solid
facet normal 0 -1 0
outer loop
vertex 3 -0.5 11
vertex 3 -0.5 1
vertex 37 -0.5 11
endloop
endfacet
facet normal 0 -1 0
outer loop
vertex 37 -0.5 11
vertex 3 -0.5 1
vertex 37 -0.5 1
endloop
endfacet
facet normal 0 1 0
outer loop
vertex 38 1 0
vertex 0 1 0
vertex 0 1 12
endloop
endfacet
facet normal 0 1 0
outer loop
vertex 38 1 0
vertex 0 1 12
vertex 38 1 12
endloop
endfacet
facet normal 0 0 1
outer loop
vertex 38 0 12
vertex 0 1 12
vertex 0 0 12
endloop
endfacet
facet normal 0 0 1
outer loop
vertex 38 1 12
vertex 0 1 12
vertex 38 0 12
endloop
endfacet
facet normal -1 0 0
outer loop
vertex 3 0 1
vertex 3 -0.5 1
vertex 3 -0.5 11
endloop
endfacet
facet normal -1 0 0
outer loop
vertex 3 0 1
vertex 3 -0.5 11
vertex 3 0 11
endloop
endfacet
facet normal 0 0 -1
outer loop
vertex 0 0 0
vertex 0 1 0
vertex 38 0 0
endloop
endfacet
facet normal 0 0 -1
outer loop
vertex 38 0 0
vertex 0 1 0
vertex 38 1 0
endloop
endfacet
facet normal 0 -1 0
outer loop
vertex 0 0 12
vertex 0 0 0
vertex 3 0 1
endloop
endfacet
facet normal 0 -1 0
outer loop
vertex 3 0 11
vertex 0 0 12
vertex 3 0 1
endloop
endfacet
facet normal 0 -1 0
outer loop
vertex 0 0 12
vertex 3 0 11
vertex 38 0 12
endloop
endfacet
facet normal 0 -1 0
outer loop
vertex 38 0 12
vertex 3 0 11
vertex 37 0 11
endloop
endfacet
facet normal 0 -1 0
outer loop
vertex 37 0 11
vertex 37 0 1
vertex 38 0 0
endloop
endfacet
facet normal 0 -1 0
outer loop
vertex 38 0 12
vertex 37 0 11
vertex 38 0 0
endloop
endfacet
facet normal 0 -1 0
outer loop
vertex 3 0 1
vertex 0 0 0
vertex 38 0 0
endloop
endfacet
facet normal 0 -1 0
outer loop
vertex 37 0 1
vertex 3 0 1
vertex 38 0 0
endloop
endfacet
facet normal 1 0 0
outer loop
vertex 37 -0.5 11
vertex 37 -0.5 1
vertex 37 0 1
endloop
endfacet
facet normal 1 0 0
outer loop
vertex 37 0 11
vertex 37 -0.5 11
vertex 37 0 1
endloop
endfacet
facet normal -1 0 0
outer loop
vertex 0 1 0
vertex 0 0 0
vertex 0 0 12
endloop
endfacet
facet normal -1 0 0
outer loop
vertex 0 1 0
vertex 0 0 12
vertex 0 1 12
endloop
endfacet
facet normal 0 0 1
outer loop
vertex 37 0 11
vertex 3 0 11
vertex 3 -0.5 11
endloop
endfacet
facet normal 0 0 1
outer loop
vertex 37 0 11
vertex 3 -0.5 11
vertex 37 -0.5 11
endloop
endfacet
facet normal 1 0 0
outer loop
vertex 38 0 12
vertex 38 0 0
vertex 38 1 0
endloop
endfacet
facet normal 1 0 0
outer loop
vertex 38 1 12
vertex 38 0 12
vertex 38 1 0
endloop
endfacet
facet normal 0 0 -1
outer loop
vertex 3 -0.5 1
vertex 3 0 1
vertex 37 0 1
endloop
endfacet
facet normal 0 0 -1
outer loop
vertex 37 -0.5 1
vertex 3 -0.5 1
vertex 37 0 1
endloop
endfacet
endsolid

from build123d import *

# Parameters (mm, degrees)
BOX_W        = 38
BOX_H        = 1
BOX_DEPTH    = 12
BOX001_W     = 34
BOX001_H     = 1
BOX001_DEPTH = 10


with BuildPart() as cubo:
    # Box → Box (new body)
    with BuildSketch(Plane.XY):
        with Locations((19, 0.5)):
            Rectangle(BOX_W, BOX_H)
    extrude(amount=BOX_DEPTH)


with BuildPart() as display:
    # Box001 → Box001 (new body)
    with BuildSketch(Plane(origin=(3, -0.5, 1), x_dir=(1, 0, 0), z_dir=(0, 0, 1))):
        with Locations((17, 0.5)):
            Rectangle(BOX001_W, BOX001_H)
    extrude(amount=BOX001_DEPTH)

    # Fusion: union Cubo
    add(cubo.part)


solid = display.part
